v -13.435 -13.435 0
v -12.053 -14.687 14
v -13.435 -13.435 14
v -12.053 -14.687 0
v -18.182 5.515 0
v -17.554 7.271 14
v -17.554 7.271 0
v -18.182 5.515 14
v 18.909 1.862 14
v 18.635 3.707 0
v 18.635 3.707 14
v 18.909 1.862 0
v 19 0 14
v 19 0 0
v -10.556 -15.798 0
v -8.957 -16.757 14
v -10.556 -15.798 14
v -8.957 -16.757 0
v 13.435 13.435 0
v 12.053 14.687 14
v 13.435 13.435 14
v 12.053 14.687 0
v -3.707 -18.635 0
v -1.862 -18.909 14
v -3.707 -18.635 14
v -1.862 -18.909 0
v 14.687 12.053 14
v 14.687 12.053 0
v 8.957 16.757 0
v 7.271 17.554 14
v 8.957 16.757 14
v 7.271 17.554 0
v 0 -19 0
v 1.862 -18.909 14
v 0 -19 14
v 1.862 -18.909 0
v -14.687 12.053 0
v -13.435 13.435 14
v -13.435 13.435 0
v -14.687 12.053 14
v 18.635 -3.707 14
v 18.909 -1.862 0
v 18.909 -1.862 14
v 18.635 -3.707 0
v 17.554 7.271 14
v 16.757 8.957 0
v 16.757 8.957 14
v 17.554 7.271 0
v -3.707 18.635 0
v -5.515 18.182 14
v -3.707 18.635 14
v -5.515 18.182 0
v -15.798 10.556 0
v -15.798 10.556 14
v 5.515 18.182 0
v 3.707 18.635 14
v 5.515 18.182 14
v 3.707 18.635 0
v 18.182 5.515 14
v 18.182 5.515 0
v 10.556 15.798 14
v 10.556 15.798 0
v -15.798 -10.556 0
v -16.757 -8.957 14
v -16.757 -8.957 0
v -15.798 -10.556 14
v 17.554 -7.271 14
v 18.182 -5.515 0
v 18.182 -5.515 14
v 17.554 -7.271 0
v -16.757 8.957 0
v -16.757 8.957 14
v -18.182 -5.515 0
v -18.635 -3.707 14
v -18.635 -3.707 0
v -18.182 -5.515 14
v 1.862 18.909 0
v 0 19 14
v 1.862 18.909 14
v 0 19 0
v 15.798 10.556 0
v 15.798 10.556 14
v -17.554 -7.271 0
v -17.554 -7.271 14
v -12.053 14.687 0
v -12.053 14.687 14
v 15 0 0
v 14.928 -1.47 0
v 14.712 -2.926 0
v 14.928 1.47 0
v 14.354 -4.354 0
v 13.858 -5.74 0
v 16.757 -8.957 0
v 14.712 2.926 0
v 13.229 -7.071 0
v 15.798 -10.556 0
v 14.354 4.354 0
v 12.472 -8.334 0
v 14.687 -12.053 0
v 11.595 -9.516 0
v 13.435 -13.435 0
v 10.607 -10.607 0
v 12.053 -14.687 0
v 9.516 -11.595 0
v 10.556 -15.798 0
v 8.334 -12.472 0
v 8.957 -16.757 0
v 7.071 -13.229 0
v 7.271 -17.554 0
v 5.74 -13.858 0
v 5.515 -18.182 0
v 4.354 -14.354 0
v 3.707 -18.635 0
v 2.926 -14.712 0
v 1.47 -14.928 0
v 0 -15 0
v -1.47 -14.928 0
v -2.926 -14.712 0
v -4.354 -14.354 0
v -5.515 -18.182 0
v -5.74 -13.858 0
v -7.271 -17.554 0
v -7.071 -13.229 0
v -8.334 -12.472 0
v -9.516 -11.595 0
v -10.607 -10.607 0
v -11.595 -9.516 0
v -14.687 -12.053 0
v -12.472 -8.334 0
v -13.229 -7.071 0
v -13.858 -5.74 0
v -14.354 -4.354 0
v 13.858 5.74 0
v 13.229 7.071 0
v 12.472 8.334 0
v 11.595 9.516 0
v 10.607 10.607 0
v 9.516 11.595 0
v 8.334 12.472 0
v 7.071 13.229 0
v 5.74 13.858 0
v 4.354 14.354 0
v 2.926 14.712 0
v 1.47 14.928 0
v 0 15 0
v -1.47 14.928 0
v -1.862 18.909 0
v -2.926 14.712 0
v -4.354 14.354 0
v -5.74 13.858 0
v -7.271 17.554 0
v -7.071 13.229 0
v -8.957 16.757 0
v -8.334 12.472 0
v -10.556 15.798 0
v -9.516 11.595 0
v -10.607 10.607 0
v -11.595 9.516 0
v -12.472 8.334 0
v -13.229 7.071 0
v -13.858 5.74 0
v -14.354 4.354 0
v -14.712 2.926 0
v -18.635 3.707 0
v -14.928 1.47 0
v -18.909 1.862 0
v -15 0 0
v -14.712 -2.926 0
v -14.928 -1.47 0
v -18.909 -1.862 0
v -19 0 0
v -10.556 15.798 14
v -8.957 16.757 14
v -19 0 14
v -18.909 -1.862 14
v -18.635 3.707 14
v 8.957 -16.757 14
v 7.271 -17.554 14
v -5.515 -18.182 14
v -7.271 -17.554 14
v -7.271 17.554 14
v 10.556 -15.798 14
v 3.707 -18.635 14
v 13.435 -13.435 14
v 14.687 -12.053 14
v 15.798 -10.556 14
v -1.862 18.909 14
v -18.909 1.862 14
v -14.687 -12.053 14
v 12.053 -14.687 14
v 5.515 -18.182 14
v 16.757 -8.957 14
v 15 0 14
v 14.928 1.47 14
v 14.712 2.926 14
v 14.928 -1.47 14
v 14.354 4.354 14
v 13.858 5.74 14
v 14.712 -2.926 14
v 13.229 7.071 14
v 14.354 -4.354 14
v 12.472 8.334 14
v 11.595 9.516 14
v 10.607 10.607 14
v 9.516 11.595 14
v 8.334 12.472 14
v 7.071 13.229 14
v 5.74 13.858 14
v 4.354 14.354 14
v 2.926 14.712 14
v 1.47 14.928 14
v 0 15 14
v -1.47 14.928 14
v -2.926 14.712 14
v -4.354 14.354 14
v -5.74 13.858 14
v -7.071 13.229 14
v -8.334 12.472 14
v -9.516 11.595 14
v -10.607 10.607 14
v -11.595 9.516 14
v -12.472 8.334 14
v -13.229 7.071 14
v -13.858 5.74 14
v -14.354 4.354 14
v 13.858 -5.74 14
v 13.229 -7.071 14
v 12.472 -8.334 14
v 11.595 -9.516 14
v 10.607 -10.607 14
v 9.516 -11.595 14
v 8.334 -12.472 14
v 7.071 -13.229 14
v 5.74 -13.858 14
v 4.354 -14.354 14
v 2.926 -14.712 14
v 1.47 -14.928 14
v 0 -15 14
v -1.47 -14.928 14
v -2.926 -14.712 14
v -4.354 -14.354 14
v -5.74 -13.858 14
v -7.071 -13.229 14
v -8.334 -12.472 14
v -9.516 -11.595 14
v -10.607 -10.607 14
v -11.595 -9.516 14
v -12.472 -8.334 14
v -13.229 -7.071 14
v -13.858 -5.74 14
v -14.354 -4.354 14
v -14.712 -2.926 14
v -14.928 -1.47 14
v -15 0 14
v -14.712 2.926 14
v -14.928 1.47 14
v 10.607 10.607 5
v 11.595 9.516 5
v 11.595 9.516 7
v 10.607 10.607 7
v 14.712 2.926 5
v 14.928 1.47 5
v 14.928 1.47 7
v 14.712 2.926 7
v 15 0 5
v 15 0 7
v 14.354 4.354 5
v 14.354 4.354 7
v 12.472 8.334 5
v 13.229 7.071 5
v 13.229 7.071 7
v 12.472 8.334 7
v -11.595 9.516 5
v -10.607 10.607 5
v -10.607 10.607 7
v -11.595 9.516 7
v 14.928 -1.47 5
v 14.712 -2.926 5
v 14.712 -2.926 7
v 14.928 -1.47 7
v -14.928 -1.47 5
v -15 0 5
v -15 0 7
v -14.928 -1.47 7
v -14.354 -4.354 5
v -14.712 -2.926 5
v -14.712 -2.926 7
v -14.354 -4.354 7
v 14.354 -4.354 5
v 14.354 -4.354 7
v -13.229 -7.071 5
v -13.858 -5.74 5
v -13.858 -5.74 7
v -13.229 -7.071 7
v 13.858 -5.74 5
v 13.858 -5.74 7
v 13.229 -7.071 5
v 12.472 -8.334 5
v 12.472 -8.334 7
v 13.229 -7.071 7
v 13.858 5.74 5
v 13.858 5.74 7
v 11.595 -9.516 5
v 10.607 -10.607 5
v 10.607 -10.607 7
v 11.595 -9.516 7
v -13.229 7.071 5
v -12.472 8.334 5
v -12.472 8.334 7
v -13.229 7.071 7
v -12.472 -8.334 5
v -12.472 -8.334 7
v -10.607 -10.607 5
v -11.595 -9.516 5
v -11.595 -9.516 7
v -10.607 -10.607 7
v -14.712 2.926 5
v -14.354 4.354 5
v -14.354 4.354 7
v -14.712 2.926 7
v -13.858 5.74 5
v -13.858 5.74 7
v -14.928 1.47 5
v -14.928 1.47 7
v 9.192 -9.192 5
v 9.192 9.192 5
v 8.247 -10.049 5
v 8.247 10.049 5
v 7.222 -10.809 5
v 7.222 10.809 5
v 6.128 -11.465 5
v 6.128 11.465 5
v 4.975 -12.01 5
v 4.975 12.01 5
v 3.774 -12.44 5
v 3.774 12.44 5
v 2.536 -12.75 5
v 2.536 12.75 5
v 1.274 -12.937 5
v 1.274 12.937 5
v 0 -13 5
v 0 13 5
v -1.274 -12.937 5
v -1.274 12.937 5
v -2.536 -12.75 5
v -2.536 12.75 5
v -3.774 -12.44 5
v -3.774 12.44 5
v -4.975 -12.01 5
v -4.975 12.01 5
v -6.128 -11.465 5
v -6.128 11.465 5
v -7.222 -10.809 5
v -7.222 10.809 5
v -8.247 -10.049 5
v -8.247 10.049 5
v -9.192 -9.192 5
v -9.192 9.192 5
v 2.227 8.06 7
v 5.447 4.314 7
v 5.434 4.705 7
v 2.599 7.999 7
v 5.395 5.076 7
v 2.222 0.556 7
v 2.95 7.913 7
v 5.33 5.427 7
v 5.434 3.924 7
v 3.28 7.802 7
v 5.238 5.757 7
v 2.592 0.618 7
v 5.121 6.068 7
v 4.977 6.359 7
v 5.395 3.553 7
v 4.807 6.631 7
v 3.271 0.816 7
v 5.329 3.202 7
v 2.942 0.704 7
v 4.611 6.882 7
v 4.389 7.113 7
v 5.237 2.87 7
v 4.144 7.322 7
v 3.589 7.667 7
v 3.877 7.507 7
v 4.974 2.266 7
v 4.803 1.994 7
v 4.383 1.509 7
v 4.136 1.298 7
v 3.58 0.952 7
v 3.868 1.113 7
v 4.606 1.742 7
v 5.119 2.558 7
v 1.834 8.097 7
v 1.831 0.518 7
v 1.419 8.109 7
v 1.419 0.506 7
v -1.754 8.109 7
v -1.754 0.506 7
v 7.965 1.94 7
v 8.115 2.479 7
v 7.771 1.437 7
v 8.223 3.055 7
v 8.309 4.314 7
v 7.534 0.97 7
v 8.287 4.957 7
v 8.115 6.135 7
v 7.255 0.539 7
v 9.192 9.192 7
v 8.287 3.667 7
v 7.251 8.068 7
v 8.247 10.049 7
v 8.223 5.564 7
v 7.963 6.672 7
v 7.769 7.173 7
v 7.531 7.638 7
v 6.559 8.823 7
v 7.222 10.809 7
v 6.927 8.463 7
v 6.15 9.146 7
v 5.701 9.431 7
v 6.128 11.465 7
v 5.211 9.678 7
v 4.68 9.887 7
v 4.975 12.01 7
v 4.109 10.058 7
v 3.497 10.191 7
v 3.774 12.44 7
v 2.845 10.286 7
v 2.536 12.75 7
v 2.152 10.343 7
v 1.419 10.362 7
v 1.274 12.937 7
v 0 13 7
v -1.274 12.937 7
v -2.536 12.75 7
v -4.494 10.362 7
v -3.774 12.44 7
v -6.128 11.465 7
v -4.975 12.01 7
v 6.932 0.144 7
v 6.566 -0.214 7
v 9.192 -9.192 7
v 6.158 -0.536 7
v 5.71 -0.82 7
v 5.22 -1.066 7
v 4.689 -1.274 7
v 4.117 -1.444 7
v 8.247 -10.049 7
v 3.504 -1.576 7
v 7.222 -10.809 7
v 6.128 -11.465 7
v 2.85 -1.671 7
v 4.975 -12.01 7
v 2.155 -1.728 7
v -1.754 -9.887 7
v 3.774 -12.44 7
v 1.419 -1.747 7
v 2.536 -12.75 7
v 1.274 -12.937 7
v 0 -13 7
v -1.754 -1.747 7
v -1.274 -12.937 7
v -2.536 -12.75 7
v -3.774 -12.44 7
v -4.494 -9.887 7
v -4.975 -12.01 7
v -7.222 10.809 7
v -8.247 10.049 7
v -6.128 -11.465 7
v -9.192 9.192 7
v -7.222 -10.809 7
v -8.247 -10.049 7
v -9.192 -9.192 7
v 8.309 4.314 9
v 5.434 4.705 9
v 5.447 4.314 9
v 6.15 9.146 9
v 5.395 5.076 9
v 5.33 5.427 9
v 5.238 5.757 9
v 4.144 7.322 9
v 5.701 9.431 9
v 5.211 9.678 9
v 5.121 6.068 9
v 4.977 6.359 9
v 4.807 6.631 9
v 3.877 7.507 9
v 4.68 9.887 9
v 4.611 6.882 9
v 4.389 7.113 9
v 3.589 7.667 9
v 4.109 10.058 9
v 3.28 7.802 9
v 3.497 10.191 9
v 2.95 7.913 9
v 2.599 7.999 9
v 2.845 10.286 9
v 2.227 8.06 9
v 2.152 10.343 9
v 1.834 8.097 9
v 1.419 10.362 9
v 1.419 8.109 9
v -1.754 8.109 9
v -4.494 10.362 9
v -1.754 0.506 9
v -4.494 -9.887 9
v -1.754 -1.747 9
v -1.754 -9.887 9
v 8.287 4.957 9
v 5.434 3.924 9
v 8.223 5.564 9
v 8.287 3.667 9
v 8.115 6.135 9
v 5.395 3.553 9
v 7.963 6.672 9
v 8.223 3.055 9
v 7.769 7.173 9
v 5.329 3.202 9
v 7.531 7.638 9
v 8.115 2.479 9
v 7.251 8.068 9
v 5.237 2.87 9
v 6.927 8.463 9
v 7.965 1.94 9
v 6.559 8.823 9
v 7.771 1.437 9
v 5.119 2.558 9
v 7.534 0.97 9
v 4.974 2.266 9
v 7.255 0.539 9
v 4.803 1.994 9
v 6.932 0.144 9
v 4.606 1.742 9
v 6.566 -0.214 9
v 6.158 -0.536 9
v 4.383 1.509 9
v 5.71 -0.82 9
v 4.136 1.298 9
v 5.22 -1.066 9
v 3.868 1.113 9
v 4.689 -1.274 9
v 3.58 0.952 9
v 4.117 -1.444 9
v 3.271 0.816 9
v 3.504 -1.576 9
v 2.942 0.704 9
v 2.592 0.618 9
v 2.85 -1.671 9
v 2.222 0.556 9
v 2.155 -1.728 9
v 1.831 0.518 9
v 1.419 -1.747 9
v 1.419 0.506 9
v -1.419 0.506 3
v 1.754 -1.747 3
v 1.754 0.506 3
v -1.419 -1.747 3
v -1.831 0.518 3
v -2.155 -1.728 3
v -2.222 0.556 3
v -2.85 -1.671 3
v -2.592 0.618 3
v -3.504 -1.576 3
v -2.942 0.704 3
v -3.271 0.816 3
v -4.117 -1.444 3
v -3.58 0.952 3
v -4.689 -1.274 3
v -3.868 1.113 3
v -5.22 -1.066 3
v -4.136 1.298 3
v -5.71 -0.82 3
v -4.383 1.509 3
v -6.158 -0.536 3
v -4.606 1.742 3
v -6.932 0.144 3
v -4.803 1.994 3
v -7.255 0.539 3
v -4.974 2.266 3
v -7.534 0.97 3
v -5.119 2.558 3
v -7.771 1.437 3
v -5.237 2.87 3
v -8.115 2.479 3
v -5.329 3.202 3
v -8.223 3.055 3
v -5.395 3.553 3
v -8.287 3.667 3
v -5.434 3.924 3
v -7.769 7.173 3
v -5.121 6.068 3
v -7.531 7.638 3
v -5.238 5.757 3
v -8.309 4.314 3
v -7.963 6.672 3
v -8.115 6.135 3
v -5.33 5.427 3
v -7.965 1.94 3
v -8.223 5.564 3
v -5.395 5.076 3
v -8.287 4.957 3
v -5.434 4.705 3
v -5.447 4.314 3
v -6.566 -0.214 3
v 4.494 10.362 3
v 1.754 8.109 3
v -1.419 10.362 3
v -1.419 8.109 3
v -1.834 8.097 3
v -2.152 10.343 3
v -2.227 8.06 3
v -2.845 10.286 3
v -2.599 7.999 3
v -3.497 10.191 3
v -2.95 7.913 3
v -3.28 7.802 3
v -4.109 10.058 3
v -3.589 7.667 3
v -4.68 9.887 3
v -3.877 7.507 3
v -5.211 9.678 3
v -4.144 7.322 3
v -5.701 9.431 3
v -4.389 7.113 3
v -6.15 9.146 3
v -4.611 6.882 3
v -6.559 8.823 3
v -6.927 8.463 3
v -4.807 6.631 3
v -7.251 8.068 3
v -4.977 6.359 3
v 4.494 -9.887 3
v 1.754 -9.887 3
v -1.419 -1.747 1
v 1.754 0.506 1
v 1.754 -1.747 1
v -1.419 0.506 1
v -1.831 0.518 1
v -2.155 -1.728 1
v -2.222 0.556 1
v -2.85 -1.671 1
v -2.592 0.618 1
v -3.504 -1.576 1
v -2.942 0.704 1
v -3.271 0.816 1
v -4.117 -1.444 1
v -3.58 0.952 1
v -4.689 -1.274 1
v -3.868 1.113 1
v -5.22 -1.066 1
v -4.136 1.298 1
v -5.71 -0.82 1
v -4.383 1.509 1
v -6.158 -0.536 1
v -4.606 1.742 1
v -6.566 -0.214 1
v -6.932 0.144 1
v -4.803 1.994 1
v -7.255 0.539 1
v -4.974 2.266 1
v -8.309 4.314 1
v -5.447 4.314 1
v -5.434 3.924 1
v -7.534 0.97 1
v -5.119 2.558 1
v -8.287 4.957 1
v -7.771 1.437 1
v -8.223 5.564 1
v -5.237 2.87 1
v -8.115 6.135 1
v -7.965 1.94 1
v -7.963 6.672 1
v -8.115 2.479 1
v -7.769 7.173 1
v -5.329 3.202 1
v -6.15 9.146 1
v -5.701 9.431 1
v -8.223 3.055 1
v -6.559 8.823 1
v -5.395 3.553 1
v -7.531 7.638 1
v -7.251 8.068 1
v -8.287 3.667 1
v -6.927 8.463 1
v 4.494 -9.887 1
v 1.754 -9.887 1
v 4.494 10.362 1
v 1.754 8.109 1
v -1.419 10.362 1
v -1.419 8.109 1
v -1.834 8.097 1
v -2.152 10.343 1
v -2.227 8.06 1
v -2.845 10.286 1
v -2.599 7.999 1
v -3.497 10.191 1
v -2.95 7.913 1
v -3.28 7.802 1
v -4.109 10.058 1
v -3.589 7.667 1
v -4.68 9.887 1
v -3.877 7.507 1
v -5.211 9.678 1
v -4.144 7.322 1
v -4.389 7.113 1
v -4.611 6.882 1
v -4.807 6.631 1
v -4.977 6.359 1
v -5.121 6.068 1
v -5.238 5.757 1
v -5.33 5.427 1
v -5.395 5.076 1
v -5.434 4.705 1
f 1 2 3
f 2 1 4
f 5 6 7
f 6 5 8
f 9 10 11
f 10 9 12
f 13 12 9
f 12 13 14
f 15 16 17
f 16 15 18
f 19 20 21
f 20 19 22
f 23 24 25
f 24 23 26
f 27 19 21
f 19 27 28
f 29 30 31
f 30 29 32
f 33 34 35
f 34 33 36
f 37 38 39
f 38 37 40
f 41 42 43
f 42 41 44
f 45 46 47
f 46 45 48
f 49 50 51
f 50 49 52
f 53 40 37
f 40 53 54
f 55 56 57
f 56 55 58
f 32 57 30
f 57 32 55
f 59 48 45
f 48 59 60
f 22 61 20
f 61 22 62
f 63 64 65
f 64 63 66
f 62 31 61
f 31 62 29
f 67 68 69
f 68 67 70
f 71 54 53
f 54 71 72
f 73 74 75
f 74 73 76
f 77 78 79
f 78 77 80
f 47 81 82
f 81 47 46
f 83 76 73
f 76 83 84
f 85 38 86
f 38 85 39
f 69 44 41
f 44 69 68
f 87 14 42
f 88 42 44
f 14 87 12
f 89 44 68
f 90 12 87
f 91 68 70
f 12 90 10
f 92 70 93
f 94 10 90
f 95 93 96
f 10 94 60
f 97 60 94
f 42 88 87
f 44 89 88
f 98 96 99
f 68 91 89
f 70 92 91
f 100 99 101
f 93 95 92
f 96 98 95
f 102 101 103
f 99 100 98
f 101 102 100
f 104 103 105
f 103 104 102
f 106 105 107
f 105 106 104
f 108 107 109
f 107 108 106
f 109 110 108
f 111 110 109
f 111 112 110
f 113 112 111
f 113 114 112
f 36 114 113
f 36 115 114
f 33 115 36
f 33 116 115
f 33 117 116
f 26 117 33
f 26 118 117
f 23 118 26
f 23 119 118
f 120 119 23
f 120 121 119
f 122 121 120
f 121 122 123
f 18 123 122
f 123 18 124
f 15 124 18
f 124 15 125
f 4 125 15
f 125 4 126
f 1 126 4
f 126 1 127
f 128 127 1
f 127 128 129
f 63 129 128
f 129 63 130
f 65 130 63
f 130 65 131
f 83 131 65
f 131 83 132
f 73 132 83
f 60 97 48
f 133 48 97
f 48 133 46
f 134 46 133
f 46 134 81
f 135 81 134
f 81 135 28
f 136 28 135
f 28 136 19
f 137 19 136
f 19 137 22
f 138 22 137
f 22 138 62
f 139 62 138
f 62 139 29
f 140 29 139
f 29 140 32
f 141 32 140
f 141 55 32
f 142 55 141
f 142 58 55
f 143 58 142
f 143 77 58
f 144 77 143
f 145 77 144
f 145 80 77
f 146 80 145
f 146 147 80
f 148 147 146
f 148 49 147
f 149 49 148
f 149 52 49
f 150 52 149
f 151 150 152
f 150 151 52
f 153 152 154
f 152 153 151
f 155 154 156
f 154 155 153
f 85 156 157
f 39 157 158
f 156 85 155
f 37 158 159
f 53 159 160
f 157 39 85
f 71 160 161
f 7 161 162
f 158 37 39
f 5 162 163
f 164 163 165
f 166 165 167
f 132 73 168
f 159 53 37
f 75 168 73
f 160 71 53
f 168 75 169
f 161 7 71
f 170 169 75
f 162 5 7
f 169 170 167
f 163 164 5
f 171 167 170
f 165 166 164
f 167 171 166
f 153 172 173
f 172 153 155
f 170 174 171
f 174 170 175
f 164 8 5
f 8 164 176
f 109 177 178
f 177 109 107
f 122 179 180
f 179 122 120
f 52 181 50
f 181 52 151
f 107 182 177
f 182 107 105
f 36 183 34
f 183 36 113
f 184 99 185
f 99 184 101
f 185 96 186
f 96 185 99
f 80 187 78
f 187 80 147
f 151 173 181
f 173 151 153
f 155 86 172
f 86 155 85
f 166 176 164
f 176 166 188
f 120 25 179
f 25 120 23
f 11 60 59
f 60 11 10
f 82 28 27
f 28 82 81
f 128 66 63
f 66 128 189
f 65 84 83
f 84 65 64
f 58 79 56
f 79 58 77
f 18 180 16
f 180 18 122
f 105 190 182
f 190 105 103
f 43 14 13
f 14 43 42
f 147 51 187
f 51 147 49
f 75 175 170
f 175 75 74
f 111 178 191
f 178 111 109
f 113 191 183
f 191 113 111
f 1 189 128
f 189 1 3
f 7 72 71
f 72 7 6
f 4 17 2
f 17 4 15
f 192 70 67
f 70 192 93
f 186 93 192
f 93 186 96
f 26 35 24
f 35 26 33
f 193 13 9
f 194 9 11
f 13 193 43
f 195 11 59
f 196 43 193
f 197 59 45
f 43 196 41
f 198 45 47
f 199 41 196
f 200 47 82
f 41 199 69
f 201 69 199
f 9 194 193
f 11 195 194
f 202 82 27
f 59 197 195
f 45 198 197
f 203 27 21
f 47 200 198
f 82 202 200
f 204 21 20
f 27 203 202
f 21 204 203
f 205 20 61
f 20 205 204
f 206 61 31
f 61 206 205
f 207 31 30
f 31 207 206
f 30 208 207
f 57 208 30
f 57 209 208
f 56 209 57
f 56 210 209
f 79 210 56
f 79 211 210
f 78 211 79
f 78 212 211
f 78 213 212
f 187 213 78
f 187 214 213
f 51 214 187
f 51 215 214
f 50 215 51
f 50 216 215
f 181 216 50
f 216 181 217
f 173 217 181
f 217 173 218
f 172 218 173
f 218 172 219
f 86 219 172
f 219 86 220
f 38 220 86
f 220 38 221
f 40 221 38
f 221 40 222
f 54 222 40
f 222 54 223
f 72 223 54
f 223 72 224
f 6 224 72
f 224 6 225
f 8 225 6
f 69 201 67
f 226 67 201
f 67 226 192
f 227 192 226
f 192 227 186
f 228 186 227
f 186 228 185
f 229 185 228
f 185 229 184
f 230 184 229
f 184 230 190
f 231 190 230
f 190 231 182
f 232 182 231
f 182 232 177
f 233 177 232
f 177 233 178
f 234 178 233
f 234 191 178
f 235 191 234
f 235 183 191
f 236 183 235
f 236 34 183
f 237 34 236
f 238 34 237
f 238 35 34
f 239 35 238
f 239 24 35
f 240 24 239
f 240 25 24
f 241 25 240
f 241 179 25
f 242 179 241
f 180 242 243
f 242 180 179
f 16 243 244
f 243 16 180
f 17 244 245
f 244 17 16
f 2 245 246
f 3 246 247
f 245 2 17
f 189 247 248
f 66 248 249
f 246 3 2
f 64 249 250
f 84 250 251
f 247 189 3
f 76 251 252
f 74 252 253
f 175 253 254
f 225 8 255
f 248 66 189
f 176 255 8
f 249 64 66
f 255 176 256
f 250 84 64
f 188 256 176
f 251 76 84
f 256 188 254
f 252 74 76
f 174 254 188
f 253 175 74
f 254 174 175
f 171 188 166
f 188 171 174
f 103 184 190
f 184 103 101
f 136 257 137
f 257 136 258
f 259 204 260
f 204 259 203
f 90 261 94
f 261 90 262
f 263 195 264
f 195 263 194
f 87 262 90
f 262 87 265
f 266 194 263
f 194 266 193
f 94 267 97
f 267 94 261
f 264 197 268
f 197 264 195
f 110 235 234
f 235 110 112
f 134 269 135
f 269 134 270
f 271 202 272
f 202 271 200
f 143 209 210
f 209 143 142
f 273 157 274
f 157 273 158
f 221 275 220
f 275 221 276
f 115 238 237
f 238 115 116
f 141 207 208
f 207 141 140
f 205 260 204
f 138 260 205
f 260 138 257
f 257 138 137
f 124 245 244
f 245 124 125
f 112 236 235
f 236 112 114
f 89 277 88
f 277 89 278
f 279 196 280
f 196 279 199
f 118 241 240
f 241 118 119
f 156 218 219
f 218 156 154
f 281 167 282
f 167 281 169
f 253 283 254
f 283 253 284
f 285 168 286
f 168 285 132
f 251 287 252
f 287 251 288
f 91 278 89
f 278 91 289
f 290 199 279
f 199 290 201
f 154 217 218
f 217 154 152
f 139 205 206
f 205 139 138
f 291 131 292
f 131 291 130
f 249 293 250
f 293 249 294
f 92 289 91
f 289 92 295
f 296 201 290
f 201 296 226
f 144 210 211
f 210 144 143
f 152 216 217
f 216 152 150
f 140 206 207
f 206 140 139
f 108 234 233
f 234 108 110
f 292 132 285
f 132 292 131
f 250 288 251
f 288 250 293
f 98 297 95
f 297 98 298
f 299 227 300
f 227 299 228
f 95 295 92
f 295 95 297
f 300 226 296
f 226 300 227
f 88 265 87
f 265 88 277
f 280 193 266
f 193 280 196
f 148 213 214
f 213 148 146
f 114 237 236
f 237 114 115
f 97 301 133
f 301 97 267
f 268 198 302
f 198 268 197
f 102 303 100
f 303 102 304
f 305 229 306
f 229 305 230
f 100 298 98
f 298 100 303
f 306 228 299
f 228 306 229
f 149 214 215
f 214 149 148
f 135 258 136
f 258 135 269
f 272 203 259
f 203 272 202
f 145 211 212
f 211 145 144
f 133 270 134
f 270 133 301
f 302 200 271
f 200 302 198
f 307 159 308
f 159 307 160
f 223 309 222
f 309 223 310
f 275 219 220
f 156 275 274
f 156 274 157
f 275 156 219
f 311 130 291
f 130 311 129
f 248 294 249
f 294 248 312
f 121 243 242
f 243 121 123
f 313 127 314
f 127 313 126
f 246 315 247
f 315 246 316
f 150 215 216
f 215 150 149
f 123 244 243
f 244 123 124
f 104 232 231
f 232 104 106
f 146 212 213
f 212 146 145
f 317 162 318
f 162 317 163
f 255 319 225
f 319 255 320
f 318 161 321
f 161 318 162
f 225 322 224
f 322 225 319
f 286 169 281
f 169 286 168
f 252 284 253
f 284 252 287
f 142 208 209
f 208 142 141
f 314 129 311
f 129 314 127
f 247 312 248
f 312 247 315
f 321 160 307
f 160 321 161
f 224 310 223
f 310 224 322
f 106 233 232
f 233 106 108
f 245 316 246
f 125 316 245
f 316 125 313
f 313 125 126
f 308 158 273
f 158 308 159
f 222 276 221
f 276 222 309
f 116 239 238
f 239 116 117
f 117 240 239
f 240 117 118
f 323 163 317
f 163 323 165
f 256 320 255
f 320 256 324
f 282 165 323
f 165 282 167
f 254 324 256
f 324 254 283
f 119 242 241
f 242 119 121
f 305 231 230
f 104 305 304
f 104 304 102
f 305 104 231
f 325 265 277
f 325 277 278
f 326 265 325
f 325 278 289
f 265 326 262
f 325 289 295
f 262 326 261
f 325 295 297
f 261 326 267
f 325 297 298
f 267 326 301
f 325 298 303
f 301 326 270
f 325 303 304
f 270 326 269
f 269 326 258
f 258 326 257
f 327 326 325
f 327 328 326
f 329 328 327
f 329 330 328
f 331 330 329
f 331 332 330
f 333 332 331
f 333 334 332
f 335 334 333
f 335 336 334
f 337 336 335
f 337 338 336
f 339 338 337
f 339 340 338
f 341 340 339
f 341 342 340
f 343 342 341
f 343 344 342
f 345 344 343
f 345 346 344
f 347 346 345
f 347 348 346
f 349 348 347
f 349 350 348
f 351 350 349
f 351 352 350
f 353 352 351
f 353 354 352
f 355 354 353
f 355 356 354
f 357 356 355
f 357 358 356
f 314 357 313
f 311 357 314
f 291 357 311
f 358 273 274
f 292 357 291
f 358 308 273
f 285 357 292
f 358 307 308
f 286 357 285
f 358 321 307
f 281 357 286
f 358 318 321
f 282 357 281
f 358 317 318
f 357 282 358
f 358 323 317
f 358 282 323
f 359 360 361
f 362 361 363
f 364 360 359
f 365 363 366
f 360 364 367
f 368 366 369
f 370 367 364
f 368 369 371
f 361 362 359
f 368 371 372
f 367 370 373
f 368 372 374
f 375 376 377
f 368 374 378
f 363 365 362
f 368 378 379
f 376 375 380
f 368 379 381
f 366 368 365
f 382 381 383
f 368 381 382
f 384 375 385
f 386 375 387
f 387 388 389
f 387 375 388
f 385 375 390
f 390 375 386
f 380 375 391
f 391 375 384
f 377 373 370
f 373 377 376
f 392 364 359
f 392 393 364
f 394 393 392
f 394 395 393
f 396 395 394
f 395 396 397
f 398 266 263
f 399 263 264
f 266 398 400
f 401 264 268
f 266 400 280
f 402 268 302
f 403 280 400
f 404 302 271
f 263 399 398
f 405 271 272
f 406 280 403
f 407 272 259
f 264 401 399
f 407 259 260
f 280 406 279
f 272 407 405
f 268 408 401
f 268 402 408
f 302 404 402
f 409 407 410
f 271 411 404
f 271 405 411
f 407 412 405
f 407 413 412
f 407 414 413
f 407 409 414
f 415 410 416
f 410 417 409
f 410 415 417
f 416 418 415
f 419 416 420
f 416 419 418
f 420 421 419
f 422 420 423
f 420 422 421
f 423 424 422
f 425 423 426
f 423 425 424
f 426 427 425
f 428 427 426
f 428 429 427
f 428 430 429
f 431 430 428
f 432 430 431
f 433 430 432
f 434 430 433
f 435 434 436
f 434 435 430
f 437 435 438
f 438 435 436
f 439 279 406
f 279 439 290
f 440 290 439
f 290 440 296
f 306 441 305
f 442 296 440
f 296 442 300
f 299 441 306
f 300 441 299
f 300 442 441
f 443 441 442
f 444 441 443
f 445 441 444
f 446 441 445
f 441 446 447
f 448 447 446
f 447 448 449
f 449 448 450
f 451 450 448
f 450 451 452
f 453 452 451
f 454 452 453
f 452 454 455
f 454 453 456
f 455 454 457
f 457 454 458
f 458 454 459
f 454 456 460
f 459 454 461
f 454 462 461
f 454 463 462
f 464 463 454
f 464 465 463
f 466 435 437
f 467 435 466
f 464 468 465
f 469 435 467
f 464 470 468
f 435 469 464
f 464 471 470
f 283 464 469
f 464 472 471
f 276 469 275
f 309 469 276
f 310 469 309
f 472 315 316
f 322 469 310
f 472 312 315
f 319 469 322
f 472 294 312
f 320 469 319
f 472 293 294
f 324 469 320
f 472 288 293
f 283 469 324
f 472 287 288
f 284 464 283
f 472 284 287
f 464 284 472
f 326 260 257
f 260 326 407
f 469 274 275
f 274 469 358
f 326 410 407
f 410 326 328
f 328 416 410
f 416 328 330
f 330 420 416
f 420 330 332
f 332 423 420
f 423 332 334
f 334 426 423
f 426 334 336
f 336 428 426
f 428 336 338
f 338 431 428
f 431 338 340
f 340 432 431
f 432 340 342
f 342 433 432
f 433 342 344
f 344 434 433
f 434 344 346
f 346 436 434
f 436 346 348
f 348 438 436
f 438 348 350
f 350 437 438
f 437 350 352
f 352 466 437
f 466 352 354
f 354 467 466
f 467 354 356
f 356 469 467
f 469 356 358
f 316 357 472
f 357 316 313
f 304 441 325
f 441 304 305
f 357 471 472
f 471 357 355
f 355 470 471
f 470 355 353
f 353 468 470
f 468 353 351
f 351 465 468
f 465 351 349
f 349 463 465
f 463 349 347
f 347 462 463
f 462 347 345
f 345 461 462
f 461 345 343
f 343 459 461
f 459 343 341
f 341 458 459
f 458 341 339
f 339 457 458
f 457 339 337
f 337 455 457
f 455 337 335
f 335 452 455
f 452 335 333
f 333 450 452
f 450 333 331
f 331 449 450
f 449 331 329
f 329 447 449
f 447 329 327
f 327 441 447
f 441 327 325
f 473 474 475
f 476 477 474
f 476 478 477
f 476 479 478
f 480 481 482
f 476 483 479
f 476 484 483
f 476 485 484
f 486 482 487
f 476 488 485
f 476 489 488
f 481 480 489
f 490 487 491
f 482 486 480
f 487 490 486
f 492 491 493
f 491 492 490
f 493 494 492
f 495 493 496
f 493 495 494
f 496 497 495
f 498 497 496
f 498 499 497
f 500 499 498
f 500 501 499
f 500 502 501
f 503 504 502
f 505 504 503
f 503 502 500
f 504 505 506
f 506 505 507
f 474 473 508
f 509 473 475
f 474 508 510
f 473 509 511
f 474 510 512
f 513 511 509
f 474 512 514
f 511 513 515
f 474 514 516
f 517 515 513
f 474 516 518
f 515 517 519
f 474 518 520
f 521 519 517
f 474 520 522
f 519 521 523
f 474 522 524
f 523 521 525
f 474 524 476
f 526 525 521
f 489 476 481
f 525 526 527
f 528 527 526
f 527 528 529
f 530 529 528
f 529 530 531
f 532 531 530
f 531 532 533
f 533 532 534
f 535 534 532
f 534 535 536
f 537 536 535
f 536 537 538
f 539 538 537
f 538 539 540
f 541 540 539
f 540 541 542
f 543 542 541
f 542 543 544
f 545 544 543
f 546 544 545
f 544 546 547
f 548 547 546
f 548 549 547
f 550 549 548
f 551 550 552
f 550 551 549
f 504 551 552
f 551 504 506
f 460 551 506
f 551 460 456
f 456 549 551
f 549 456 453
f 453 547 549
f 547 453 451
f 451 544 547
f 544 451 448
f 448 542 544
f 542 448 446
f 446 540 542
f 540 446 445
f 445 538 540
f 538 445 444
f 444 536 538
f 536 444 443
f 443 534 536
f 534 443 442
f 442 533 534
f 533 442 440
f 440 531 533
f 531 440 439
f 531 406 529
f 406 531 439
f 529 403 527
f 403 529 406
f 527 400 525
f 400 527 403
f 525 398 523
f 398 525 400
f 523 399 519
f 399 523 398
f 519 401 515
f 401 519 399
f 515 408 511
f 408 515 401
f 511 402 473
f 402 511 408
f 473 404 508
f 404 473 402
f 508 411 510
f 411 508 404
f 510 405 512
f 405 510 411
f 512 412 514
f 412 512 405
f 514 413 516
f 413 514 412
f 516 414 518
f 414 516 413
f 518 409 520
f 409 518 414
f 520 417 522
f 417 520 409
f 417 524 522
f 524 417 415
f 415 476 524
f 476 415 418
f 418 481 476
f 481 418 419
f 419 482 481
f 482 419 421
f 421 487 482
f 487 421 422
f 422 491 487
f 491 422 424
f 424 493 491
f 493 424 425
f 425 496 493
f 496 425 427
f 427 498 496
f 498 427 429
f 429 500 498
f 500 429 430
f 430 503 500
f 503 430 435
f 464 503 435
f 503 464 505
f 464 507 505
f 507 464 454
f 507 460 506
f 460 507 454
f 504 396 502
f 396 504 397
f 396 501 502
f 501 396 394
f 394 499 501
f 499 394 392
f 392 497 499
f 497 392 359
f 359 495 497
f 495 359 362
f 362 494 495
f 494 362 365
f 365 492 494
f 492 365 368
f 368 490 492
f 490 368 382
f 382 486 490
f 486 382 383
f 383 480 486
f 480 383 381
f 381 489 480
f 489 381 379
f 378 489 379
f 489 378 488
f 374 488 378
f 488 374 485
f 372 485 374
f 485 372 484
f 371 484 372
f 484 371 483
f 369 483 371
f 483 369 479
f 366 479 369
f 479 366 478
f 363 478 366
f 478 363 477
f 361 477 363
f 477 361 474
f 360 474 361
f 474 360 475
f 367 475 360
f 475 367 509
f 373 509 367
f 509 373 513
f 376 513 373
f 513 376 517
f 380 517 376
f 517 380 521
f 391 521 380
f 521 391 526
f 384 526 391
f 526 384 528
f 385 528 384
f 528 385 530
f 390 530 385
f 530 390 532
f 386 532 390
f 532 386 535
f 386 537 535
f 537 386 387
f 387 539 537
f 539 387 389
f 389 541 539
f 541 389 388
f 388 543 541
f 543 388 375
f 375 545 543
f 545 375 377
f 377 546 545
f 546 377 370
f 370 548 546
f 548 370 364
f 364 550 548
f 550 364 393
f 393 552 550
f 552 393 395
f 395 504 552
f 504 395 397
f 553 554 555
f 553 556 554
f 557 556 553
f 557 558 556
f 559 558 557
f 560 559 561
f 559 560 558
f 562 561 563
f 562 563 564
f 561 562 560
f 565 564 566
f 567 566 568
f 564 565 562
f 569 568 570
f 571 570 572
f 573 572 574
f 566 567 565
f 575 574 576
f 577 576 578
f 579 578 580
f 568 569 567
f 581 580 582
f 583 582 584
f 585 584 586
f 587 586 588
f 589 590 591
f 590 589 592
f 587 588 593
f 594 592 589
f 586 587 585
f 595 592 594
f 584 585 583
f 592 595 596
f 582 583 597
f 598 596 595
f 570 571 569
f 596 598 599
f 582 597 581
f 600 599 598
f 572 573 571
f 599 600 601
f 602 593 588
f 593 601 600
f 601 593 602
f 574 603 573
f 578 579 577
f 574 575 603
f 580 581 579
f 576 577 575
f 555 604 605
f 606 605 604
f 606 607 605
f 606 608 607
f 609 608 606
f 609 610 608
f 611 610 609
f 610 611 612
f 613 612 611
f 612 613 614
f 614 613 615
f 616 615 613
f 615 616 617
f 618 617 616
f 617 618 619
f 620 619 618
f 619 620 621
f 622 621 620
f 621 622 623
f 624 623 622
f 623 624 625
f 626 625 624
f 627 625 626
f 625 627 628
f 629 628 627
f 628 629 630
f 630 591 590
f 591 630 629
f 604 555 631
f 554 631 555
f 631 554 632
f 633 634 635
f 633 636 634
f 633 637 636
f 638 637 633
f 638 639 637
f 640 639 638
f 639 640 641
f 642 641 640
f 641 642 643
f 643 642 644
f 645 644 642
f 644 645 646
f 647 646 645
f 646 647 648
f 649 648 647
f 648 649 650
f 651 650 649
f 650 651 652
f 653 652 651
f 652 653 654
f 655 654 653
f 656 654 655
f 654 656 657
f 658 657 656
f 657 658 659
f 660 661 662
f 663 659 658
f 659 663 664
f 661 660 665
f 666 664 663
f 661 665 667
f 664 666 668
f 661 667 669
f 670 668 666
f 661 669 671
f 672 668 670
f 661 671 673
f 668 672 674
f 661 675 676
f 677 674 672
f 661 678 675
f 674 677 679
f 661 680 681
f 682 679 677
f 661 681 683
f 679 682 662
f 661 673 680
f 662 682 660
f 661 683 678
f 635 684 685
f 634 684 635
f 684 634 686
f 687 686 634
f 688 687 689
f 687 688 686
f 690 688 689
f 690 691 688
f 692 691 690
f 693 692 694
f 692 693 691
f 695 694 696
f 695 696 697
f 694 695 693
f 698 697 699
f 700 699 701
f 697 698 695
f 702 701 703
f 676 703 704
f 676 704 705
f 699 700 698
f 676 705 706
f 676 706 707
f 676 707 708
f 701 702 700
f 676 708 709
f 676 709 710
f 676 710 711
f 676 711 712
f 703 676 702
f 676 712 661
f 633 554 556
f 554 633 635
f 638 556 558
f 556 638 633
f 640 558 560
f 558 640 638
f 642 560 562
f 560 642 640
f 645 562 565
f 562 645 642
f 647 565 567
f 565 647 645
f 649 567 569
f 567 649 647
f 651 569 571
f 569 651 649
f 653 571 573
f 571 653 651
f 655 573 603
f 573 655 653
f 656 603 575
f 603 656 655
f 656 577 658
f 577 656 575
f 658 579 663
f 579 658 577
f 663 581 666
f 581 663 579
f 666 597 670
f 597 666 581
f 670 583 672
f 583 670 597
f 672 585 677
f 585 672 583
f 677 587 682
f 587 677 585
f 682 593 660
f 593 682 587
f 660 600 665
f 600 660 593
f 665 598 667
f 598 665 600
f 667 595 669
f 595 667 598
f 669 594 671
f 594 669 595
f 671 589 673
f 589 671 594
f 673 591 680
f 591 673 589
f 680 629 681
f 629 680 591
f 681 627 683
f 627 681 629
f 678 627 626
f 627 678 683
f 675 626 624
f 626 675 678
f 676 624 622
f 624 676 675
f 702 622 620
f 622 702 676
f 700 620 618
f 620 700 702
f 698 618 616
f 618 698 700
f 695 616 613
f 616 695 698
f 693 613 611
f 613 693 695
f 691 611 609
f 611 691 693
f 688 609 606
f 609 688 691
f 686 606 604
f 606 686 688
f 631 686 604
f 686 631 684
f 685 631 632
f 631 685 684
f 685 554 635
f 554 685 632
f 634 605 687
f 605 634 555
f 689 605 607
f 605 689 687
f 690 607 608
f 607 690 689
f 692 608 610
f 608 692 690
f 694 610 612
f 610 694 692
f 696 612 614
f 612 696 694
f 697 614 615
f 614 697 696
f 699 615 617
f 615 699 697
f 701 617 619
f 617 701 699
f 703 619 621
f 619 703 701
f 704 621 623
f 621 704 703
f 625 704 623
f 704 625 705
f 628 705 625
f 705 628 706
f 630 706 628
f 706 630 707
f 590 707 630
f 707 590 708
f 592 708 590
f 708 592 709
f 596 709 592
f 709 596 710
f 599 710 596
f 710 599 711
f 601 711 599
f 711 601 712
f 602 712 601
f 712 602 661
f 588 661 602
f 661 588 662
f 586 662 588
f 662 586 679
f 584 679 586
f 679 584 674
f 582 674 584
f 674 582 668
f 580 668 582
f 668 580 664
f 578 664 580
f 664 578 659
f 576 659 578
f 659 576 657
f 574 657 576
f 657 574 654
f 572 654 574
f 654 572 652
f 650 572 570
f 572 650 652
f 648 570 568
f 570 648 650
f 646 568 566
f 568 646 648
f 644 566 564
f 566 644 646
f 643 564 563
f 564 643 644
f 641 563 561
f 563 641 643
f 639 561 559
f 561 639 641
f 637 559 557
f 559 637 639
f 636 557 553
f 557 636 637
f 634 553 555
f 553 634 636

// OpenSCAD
/*
 * Replacement coin for vintage Frisher Price Retro Cash Register
 *
 * URL: https://github.com/rixvet/print3D-OpenSCAD
 * License: CC-BY-SA-4.0 license
 */

// Radius of coin
radius = 19;

// Diameter of wall
wall = 4;

// Height of plate/text
plate = 2;

// Height of coin
height = 14;
 
// Text to print on TOP of coin
top_text = "P";

// Text to print on Bottom of coin
bottom_text = "P";

// Size of text
text_size = 20;

/* [Other options] */
$fn = 64;

// Outer shell
difference() {
cylinder(h=height,r=radius);
translate([0,0,-1]) cylinder(h=height+2,r=radius-wall);
}

// Inner plate
middle = (height-wall)/2;
translate([0, 0, middle]) 
difference() {
    cylinder(h=plate, r=radius);
    rotate([0,0,45]) translate([0,0,-1]) rotate_extrude(angle=90) translate([radius-wall-plate,0,0]) square([plate,radius]);
    rotate([0,0,180+45]) translate([0,0,-1]) rotate_extrude(angle=90) translate([radius-wall-plate,0,0]) square([plate,radius]);
}


// Text decoration
module tttext() {
    linear_extrude(plate) text(text=top_text, size=text_size, halign="center", valign="center", font="monospace");
}
translate([1, 0, middle+plate]) tttext();
translate([-1, 0, middle-plate]) rotate([180,0,180]) tttext();
